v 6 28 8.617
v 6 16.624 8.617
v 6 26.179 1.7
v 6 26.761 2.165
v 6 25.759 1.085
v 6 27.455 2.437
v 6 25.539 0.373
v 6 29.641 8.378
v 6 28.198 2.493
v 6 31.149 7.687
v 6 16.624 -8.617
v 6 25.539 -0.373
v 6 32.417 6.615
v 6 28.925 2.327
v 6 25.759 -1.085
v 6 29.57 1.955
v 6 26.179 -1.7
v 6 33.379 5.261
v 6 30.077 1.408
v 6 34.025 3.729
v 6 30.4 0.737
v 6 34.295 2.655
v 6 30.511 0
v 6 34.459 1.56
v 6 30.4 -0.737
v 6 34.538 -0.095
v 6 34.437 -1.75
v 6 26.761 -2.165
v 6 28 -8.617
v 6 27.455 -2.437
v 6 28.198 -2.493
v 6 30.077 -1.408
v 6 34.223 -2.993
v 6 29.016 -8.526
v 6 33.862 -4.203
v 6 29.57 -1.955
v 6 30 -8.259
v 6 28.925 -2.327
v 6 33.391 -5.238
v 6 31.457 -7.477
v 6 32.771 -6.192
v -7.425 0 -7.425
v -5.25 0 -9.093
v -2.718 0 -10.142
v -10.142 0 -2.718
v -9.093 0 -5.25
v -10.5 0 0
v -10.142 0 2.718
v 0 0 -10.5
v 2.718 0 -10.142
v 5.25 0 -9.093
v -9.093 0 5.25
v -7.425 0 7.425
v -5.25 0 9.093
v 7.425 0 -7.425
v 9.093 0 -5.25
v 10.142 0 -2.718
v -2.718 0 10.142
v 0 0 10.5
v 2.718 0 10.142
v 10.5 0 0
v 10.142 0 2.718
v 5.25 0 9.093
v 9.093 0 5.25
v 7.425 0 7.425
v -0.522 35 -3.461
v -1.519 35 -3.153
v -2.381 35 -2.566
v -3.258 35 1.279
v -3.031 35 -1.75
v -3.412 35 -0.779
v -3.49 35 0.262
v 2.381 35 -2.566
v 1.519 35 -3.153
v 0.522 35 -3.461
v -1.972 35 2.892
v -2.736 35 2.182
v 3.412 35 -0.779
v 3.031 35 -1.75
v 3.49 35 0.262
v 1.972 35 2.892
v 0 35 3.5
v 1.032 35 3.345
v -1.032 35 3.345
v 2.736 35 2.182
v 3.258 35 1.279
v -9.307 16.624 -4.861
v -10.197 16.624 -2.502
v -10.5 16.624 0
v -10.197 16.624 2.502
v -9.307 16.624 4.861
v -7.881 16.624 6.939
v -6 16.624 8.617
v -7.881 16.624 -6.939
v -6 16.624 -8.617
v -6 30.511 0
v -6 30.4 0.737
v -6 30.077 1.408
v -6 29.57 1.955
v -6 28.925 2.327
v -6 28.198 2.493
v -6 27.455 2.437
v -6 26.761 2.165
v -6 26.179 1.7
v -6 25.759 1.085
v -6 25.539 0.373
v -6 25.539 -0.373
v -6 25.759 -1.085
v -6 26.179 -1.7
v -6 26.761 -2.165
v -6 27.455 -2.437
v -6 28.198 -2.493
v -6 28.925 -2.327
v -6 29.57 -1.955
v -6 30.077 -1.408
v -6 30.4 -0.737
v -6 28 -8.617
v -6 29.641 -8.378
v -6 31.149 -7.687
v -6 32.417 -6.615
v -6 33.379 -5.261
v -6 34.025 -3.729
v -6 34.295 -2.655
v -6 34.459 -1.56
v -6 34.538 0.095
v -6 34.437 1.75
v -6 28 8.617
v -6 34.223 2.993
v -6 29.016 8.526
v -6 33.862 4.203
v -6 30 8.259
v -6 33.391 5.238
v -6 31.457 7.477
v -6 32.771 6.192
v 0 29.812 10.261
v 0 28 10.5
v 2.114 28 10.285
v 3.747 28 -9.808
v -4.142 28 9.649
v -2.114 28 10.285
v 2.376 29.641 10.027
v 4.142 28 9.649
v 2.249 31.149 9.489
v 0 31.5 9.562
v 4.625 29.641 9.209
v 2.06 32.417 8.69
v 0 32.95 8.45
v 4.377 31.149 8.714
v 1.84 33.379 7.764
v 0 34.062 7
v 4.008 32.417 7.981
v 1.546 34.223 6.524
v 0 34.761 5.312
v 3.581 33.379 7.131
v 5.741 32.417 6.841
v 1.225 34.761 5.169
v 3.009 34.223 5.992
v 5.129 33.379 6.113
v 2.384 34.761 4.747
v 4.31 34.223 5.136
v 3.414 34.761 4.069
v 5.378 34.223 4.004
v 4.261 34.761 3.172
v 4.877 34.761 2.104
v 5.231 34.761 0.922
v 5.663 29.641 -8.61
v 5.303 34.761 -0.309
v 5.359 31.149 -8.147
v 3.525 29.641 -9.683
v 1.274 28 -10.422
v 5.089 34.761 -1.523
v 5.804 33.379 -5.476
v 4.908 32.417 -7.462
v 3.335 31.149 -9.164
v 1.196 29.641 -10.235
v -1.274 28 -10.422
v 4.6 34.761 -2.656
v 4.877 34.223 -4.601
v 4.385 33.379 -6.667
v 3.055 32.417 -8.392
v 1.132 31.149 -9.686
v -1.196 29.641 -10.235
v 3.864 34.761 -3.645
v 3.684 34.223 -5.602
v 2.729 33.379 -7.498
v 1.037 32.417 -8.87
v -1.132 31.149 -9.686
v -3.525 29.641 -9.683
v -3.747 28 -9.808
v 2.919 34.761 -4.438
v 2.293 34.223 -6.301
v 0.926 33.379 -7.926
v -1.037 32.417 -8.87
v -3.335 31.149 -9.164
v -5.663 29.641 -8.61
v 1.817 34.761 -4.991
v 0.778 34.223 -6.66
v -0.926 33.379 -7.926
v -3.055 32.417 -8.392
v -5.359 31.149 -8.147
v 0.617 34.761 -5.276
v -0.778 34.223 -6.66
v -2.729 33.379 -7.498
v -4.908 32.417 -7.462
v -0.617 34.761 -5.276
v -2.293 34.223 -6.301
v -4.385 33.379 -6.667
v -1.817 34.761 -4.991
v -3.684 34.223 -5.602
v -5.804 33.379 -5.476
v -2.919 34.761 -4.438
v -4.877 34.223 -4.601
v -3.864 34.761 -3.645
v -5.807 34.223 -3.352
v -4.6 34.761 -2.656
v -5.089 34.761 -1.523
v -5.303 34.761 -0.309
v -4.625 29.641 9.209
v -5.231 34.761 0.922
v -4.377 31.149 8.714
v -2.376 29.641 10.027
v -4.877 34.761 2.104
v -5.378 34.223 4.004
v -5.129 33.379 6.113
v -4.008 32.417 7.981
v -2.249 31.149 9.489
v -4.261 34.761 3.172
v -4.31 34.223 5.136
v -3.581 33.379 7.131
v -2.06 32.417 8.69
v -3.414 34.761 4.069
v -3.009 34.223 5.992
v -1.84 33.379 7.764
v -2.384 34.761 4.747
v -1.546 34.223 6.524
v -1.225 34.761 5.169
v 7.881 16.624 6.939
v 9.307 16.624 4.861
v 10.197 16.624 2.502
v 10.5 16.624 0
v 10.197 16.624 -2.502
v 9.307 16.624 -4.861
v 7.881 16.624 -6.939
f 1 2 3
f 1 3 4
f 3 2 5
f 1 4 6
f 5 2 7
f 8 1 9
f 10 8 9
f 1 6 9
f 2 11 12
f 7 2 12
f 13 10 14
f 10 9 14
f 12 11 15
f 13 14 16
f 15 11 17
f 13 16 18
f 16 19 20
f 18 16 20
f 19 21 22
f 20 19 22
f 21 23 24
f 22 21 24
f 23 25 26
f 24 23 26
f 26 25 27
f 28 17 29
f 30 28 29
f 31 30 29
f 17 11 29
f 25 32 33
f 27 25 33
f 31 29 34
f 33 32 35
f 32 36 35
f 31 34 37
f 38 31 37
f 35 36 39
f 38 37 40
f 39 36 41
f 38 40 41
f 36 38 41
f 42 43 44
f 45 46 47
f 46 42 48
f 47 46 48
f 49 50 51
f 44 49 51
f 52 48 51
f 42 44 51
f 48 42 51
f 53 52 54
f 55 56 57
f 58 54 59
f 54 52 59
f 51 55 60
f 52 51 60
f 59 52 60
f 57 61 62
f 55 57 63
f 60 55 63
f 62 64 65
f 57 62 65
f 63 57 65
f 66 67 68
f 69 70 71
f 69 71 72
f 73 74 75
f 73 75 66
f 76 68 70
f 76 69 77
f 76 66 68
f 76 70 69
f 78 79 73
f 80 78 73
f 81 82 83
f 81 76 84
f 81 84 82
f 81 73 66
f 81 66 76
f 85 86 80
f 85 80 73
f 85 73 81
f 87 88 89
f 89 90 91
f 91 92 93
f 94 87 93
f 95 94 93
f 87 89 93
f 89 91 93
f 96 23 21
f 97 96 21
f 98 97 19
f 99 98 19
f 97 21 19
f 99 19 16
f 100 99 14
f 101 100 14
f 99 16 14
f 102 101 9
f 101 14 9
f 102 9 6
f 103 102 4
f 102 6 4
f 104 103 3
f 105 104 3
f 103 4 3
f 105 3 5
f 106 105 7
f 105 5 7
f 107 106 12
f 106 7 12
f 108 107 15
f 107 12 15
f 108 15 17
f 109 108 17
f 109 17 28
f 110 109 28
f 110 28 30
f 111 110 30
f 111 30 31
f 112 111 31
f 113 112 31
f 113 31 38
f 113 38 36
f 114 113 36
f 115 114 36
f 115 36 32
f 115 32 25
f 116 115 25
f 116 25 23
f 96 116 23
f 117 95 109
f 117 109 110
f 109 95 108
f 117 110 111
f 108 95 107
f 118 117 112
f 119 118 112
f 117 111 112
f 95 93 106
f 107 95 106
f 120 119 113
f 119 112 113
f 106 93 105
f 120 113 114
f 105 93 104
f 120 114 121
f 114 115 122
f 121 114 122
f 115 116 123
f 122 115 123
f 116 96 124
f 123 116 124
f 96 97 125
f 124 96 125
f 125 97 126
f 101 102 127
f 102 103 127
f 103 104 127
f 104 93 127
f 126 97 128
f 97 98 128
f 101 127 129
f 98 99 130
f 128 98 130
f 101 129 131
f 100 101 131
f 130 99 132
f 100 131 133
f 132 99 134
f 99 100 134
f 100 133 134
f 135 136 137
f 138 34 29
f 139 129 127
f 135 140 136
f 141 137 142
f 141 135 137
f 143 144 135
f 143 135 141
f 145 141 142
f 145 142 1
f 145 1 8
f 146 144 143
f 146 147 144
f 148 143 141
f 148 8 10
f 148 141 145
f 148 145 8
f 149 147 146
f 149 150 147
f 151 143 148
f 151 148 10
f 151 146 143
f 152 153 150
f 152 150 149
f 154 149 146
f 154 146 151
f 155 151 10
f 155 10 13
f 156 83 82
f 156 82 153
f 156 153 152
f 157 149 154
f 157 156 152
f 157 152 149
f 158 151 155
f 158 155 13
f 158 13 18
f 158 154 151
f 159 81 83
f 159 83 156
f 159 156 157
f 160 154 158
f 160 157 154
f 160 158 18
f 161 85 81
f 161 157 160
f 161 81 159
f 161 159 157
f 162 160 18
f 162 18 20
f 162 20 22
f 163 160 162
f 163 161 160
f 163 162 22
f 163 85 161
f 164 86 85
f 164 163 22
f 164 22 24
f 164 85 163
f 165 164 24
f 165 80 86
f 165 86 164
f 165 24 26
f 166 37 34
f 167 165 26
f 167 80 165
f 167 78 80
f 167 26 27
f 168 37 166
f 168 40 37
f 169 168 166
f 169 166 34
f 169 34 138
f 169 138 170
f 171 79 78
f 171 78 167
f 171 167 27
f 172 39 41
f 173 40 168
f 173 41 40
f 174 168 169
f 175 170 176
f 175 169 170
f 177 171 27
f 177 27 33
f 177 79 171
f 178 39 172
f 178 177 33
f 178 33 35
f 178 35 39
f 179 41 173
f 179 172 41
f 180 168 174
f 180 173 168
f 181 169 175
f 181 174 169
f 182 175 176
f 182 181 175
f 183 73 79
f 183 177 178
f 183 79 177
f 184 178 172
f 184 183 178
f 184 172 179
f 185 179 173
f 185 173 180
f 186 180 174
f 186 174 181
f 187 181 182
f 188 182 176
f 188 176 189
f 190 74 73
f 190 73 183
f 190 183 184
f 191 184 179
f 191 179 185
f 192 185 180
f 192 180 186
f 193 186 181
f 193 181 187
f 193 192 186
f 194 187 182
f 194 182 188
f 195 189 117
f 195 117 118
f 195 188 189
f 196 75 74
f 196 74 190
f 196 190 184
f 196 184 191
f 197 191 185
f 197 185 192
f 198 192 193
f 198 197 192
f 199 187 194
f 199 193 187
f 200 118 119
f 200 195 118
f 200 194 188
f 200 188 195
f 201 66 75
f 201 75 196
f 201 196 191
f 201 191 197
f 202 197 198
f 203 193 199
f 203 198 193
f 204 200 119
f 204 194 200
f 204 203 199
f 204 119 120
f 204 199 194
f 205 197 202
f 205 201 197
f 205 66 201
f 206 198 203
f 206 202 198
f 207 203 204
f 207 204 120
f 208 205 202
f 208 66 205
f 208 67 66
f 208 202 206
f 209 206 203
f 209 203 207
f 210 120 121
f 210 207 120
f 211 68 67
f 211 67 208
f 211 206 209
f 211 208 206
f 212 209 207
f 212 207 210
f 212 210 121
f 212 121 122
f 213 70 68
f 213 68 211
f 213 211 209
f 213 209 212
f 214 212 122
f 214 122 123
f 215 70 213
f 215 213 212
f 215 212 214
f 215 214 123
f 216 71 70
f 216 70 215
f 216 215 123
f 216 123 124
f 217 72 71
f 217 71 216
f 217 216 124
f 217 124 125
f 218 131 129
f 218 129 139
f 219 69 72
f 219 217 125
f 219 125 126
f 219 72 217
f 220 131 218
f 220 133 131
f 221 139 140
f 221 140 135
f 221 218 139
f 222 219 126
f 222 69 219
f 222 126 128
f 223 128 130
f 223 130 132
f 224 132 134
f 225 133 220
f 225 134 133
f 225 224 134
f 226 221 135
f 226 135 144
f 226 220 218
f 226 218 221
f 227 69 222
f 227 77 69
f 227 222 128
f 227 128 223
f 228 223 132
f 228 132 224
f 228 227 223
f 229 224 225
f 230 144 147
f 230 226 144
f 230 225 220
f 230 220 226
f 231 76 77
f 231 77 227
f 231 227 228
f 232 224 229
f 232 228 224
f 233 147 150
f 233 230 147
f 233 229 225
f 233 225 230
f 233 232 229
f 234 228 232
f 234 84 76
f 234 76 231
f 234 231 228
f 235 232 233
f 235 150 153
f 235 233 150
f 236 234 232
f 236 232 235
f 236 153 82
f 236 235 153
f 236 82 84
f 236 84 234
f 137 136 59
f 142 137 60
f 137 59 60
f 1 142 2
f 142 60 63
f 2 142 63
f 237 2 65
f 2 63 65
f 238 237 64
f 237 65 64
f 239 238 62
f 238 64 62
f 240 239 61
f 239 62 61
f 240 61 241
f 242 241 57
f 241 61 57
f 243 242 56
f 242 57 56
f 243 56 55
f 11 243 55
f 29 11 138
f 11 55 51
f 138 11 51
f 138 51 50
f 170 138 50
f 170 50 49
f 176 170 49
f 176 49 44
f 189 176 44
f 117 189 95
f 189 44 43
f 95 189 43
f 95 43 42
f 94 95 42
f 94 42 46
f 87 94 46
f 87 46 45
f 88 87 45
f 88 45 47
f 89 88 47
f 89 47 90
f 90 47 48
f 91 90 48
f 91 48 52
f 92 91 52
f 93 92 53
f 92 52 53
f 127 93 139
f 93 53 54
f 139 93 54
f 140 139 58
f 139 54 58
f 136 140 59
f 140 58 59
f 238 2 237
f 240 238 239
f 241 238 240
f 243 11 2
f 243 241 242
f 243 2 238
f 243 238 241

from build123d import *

# Parameters (mm, degrees)
SKETCH_1_R          = 10.5
EXTRUDE_1_DEPTH     = 35
FILLET_1_R          = 7
SKETCH_2_W          = 7.958584752
SKETCH_2_H          = 21.543065623
CUT_EXTRUDE_2_DEPTH = 20
SKETCH_3_R          = 2.5
CUT_EXTRUDE_3_DEPTH = 41.093640507


with BuildPart() as part:
    # Эскиз1 → Вытянуть1 (new body)
    with BuildSketch(Plane(origin=(0, 0, 0), x_dir=(1, 0, 0), z_dir=(0, 1, 0))):
        with Locations(Location((0, 0, 0), (0, 0, 270))):
            Circle(SKETCH_1_R)
    extrude(amount=EXTRUDE_1_DEPTH)

    # Скругление1
    fillet_1_edges = [part.edges().sort_by_distance(p)[0] for p in [
        (0, 35, -10.5),
    ]]
    fillet(fillet_1_edges, radius=FILLET_1_R)

    # Эскиз2 → Вытянуть2 (cut, symmetric)
    with BuildSketch(Plane.XY):
        with Locations((9.979292376, 27.395051325)):
            Rectangle(SKETCH_2_W, SKETCH_2_H)
        with Locations((-9.979292376, 27.395051325)):
            Rectangle(SKETCH_2_W, SKETCH_2_H)
    extrude(amount=CUT_EXTRUDE_2_DEPTH, both=True, mode=Mode.SUBTRACT)

    # Эскиз3 → Вытянуть3 (cut, through all)
    with BuildSketch(Plane(origin=(6, 0, 0), x_dir=(0, 0, -1), z_dir=(1, 0, 0))):
        with Locations(Location((0, 28.011489149, 0), (0, 0, 90))):
            Circle(SKETCH_3_R)
    extrude(amount=-CUT_EXTRUDE_3_DEPTH, mode=Mode.SUBTRACT)


solid = part.part
